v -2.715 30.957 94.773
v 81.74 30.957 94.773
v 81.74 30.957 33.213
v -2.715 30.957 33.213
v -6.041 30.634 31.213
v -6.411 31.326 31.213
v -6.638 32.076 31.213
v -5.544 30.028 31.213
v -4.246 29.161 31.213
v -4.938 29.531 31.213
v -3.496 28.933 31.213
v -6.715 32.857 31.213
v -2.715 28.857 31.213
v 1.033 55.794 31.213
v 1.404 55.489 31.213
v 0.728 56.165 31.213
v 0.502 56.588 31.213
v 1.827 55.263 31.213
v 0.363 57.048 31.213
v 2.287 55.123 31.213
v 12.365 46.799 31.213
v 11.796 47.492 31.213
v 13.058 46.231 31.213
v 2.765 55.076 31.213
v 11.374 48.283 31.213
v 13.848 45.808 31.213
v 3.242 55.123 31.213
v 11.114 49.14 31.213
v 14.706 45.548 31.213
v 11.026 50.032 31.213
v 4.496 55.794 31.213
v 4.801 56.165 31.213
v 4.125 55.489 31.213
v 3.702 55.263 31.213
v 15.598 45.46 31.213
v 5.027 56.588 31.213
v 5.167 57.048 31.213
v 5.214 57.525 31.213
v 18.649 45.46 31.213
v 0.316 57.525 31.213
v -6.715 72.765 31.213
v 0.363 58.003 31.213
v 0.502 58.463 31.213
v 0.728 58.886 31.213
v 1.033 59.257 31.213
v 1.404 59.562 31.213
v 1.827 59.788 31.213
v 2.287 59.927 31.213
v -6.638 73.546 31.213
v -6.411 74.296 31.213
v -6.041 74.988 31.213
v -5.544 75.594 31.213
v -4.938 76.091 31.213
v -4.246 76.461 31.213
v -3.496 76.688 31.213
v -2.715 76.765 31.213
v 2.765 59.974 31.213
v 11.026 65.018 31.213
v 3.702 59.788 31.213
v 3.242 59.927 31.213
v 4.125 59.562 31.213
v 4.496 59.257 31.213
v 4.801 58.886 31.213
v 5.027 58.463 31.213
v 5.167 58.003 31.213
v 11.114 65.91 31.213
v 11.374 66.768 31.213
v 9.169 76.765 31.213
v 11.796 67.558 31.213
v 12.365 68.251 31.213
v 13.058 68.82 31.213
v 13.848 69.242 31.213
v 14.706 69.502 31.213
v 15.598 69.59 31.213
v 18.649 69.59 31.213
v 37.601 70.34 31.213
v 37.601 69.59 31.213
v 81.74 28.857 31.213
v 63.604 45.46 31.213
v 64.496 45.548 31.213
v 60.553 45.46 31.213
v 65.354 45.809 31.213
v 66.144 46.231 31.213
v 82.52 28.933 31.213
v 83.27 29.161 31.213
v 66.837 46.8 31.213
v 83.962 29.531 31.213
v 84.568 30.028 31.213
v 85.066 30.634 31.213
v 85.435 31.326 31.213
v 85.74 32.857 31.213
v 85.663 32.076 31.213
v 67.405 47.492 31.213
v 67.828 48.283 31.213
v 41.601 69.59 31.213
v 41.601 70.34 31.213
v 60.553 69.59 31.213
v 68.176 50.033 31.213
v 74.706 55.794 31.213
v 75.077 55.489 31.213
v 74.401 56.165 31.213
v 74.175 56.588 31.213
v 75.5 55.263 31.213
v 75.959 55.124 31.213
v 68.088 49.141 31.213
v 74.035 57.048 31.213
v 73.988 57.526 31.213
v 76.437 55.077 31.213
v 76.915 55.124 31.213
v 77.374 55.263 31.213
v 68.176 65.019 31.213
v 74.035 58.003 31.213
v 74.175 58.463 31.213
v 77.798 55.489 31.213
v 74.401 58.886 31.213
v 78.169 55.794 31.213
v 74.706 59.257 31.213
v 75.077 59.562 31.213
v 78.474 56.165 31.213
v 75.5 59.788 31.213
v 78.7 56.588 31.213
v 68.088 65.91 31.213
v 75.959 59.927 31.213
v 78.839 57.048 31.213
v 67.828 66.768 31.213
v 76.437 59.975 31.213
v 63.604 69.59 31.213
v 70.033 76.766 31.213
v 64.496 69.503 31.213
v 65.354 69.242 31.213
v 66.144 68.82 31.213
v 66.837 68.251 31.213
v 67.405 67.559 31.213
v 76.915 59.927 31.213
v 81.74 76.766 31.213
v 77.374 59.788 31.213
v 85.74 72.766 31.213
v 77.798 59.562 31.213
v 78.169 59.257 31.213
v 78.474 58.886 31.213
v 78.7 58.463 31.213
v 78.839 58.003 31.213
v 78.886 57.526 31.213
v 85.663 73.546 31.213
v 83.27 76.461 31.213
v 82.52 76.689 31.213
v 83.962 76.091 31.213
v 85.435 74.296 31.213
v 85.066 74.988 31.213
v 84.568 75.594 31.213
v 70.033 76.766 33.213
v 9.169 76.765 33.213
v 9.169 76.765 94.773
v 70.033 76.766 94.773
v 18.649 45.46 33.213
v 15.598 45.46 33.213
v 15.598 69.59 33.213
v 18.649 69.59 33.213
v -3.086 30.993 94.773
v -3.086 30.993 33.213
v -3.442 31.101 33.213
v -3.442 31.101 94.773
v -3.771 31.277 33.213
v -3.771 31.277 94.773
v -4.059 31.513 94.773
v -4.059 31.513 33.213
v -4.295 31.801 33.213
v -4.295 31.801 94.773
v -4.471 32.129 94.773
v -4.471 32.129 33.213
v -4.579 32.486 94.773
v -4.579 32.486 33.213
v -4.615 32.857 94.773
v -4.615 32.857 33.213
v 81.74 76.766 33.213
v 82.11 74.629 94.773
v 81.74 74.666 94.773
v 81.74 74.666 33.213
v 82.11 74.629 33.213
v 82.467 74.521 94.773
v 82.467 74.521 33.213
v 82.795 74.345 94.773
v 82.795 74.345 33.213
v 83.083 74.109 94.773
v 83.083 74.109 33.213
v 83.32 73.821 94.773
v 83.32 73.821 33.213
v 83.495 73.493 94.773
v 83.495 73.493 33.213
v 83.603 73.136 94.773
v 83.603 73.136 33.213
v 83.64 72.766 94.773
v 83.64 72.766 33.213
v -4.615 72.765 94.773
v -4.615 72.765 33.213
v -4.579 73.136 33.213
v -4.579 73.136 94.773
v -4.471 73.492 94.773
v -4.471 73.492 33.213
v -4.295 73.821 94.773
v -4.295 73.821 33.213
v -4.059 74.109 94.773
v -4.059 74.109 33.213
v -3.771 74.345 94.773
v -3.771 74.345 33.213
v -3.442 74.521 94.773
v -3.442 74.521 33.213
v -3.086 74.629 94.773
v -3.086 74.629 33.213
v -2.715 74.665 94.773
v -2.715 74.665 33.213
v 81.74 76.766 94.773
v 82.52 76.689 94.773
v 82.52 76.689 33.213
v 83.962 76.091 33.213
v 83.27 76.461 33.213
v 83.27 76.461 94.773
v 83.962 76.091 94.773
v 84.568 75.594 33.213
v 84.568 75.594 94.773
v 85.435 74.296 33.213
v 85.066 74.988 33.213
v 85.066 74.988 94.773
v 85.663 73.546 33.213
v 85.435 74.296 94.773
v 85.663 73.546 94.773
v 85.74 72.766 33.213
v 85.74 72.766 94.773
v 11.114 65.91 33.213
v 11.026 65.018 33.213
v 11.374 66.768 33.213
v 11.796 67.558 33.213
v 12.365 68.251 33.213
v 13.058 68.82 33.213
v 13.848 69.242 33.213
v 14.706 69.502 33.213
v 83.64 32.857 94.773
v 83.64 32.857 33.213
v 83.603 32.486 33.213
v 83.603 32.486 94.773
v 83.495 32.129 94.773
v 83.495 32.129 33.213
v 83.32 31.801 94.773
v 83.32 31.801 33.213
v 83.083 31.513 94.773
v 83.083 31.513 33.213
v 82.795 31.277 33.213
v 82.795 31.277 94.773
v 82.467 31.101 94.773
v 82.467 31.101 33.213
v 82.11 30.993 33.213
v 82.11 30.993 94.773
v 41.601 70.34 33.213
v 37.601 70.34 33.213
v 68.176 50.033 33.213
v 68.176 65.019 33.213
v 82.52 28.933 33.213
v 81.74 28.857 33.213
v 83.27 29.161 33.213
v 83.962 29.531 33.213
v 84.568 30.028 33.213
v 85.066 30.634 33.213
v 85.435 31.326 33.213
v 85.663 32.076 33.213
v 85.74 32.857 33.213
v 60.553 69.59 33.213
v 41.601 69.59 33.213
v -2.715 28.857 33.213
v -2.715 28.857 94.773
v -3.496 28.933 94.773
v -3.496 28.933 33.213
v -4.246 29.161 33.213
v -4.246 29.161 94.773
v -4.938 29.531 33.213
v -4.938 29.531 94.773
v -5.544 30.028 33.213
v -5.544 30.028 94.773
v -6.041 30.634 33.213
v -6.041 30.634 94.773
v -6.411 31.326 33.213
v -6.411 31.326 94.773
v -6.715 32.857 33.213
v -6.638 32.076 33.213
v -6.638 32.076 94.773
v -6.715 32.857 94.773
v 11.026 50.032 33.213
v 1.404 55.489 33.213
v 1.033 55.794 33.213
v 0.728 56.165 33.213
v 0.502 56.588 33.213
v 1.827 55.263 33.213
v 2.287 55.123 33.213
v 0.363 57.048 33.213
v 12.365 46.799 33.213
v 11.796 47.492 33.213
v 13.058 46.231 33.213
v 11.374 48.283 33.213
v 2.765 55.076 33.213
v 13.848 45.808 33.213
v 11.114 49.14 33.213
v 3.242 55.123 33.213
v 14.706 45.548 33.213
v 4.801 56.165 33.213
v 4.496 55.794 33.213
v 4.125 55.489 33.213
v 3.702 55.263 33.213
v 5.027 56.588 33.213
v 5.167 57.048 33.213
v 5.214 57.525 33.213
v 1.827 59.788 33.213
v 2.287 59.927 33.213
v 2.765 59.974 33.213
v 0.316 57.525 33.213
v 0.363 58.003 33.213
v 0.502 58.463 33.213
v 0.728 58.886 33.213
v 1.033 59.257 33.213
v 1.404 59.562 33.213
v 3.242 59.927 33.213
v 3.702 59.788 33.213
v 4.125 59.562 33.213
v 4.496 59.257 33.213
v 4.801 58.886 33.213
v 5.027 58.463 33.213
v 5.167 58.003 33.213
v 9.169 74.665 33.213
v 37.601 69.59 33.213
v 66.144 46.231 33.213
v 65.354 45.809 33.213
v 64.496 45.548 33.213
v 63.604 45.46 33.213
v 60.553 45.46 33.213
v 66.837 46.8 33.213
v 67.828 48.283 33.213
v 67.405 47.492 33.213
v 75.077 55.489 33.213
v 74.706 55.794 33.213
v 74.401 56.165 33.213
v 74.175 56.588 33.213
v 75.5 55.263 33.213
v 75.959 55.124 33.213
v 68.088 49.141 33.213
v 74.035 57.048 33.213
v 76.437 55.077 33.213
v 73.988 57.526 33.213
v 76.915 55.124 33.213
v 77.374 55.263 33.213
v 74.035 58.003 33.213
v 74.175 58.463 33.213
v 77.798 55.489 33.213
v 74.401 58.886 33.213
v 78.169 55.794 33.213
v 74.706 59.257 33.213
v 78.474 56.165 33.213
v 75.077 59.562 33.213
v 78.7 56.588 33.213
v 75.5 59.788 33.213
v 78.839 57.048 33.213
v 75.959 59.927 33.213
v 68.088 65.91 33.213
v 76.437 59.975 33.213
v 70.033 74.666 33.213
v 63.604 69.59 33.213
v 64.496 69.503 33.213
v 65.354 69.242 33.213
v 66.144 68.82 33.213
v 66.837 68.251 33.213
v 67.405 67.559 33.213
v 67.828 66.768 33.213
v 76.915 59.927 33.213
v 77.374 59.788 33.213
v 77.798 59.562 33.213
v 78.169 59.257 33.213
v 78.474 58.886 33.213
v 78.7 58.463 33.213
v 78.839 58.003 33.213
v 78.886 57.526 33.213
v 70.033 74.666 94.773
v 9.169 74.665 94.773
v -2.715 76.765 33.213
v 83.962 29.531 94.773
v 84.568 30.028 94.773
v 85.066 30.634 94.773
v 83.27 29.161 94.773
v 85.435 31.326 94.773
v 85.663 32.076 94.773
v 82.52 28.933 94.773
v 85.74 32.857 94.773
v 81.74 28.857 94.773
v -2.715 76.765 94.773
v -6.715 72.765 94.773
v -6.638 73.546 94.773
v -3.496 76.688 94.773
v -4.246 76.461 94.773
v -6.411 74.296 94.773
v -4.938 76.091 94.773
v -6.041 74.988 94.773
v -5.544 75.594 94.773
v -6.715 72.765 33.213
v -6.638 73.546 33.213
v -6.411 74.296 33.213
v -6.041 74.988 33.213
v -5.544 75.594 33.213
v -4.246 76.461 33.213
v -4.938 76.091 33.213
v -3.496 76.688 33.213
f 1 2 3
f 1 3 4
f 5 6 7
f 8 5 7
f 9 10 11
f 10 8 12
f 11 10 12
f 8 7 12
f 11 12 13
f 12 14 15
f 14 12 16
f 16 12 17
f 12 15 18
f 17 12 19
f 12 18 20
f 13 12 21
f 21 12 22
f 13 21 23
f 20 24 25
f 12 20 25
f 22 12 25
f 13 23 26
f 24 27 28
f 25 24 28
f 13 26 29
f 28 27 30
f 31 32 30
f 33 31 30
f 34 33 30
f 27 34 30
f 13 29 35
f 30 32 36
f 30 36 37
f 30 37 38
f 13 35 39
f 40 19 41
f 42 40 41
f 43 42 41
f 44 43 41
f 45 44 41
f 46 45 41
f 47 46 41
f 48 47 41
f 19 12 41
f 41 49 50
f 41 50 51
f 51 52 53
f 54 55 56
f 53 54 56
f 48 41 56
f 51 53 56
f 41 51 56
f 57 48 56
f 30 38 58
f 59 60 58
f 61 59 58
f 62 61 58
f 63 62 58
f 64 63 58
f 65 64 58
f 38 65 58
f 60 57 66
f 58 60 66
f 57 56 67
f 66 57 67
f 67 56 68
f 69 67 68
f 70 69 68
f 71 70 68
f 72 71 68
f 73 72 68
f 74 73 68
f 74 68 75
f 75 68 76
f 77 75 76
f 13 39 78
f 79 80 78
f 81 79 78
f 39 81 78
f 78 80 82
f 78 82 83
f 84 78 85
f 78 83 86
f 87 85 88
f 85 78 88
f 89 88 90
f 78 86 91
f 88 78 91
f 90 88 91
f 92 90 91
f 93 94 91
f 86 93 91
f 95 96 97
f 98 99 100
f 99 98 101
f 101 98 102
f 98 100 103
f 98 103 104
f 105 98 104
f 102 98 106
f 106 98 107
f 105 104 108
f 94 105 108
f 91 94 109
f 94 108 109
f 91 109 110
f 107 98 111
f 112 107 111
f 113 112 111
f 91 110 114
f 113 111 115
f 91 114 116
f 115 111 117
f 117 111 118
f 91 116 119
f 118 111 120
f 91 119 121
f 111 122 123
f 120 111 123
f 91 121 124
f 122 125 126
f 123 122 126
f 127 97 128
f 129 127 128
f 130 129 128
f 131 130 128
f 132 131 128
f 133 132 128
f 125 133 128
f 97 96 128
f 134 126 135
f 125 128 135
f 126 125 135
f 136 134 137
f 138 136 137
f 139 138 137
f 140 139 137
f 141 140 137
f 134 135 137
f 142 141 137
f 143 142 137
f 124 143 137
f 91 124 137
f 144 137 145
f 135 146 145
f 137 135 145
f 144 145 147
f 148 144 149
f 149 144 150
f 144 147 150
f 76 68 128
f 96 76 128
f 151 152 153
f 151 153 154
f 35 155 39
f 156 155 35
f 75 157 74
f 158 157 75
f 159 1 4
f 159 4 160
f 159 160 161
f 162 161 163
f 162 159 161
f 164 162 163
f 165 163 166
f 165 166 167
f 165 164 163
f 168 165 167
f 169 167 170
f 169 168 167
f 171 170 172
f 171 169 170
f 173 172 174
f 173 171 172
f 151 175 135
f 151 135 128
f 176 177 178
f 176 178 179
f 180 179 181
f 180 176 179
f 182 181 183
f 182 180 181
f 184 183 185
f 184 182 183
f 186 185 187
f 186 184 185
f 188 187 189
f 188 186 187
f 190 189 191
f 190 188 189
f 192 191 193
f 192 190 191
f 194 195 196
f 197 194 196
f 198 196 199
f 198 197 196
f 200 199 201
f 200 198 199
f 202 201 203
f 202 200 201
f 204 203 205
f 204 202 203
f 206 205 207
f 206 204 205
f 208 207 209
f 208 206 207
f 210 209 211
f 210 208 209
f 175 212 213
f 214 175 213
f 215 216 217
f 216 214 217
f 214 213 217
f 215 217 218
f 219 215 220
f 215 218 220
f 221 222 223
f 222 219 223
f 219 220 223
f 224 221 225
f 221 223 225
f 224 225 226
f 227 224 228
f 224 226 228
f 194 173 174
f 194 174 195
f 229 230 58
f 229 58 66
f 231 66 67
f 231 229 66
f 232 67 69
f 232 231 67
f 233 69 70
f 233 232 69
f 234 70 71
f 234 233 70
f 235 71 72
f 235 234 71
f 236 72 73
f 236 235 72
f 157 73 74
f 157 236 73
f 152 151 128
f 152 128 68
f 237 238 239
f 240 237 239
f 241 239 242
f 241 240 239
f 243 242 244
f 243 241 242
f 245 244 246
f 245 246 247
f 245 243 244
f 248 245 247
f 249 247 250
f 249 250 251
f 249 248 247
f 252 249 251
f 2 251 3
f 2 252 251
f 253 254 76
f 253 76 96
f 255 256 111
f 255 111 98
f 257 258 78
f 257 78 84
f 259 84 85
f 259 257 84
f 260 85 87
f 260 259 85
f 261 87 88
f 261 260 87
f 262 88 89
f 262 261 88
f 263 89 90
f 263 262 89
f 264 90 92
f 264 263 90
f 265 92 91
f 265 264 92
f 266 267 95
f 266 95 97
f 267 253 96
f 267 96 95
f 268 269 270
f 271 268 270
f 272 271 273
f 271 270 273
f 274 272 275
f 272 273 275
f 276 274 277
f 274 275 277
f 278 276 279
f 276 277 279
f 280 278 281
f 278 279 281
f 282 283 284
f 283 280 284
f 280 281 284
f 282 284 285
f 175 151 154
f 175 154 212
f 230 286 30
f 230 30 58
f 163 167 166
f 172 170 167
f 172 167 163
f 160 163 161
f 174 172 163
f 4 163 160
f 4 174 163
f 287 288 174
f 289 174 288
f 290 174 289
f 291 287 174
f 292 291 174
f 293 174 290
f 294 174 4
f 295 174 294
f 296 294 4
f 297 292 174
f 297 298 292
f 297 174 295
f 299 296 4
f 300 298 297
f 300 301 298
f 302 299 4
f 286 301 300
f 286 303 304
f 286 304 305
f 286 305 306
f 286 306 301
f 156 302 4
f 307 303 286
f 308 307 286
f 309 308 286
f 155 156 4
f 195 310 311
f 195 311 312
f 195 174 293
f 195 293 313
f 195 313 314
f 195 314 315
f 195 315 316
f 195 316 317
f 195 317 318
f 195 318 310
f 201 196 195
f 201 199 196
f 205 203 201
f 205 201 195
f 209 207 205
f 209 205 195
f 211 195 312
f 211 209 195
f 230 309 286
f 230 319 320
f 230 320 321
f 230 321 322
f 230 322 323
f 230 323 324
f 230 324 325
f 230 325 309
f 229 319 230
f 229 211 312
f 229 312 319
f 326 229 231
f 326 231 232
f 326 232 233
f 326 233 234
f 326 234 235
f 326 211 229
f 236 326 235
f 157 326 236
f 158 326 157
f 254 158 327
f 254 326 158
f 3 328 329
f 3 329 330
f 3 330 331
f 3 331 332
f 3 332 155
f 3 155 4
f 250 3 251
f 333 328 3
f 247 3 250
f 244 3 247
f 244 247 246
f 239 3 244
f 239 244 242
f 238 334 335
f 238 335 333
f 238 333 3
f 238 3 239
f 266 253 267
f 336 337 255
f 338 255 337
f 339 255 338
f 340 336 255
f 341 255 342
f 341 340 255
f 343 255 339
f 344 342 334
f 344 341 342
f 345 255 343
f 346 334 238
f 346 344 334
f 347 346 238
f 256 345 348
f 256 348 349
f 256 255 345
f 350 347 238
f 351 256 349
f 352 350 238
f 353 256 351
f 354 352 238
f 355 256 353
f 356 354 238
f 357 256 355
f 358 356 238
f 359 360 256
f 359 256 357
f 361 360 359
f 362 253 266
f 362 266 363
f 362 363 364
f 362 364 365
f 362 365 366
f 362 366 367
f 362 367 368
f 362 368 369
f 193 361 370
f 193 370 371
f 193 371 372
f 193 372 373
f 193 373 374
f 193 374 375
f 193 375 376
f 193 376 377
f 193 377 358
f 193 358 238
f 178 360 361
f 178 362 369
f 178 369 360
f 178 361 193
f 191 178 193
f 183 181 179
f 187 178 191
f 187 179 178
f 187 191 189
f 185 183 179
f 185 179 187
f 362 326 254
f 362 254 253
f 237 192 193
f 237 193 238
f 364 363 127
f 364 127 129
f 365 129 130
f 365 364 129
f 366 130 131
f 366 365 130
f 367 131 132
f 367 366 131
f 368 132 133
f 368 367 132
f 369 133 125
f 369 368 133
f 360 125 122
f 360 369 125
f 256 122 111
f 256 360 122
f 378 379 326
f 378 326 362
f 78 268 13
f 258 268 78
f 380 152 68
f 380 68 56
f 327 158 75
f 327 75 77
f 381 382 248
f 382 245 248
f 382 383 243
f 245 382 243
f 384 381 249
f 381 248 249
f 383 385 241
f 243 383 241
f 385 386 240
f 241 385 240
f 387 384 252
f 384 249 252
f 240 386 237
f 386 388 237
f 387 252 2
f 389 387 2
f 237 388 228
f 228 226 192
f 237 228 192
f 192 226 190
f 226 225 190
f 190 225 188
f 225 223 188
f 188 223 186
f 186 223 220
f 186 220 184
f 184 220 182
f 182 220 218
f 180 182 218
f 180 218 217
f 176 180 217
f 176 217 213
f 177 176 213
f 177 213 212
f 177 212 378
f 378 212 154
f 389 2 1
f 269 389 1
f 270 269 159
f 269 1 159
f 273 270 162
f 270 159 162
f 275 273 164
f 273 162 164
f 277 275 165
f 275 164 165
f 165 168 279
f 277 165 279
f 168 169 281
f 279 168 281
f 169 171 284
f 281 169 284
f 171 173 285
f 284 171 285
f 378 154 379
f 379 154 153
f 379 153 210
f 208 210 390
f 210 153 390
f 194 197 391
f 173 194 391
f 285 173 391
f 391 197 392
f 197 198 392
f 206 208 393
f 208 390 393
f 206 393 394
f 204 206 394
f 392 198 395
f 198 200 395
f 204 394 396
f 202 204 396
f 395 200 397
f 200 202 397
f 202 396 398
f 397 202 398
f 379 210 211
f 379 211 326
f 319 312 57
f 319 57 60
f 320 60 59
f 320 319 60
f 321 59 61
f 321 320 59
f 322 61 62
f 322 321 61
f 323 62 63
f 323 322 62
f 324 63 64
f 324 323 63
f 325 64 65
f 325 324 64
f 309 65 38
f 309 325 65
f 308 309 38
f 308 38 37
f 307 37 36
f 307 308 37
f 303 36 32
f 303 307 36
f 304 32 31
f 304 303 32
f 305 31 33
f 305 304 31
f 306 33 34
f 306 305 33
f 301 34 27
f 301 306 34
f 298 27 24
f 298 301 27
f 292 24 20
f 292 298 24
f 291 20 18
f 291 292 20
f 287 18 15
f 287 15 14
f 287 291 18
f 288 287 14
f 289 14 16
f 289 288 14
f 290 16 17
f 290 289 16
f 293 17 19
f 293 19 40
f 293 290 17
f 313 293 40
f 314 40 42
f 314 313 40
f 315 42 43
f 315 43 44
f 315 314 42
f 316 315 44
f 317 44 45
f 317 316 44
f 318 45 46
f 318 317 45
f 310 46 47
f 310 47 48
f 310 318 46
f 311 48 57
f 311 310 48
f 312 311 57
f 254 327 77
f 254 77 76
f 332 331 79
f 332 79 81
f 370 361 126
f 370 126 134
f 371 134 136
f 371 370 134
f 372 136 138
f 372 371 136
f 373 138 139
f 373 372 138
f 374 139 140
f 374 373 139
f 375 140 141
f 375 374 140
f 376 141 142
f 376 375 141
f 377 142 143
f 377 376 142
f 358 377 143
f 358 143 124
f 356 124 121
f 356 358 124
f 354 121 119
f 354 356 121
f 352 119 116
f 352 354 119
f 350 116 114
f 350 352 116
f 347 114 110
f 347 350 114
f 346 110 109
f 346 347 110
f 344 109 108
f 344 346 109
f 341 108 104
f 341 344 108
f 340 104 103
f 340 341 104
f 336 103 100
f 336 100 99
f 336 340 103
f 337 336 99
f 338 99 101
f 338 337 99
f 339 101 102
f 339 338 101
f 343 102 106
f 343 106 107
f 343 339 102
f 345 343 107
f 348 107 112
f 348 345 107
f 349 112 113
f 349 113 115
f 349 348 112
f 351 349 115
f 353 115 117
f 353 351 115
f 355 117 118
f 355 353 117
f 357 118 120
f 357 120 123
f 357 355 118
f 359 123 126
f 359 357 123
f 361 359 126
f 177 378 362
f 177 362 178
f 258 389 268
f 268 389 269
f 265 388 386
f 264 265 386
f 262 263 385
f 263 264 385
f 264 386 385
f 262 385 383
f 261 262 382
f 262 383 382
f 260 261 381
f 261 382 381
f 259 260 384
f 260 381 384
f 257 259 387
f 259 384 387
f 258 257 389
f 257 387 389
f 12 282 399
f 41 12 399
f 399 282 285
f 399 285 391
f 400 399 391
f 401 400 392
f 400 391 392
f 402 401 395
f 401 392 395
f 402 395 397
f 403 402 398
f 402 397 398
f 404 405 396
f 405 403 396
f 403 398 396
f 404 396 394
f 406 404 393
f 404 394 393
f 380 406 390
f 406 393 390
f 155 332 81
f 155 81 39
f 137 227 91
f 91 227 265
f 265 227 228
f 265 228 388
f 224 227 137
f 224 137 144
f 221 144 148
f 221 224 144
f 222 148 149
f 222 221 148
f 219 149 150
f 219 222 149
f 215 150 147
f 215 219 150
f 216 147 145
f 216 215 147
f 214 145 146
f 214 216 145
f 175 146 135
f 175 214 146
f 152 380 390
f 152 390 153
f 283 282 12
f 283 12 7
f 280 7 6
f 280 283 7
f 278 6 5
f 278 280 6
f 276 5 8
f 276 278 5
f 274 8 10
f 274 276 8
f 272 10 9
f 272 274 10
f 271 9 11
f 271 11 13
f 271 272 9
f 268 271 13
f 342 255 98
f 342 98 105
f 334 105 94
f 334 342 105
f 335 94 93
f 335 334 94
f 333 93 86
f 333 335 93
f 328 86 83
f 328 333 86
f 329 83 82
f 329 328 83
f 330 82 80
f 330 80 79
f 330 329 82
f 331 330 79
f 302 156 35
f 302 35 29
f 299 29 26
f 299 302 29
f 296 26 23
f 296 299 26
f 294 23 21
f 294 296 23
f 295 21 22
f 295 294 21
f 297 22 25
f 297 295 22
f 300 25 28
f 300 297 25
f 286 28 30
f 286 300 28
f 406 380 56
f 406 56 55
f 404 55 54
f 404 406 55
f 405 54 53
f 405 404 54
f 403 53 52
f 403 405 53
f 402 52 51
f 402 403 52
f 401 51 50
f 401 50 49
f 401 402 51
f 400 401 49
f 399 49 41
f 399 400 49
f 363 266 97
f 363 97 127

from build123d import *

# Parameters (mm, degrees)
SKETCH1_R           = 2.449
BOSS_EXTRUDE1_DEPTH = 2
BOSS_EXTRUDE2_START = 61.5600102
BOSS_EXTRUDE2_DEPTH = 61.5600102


with BuildPart() as part:
    # Sketch1 → Boss-Extrude1 (new body)
    with BuildSketch(Plane(origin=(0, 7e-09, 33.21323041), x_dir=(-1, 0, 0), z_dir=(0, -2.14626958308228e-10, -1.0))):
        with BuildLine():
            Line((-81.739723186, 76.765508674), (-70.033136805, 76.765508674))
            Line((-70.033136805, 76.765508674), (-9.168561928, 76.76533218))
            Line((-9.168561928, 76.76533218), (2.715276814, 76.76533218))
            ThreePointArc((2.715276814, 76.76533218), (5.543703939, 75.593759305), (6.715276814, 72.76533218))
            Line((6.715276814, 72.76533218), (6.715276814, 40.456513609))
            Line((6.715276814, 40.456513609), (6.715276814, 38.856513609))
            Line((6.715276814, 38.856513609), (6.715276814, 32.856513609))
            ThreePointArc((6.715276814, 32.856513609), (5.543703939, 30.028086484), (2.715276814, 28.856513609))
            Line((2.715276814, 28.856513609), (-81.739723186, 28.856513609))
            ThreePointArc((-81.739723186, 28.856513609), (-84.56815031, 30.028086484), (-85.739723186, 32.856513609))
            Line((-85.739723186, 32.856513609), (-85.739723186, 38.856513609))
            Line((-85.739723186, 38.856513609), (-85.739723186, 40.456513609))
            Line((-85.739723186, 40.456513609), (-85.739723186, 72.765508674))
            ThreePointArc((-85.739723186, 72.765508674), (-84.56815031, 75.593935798), (-81.739723186, 76.765508674))
        make_face()
        with Locations(Location((-2.764563873, 57.52531361, 0), (0, 0, 90))):
            Circle(SKETCH1_R, mode=Mode.SUBTRACT)
        with Locations(Location((-76.437246444, 57.525527244, 0), (0, 0, 90))):
            Circle(SKETCH1_R, mode=Mode.SUBTRACT)
        with BuildLine():
            Line((-63.603943309, 45.46049003), (-60.552841344, 45.460481183))
            Line((-60.552841344, 45.460481183), (-18.649041914, 45.460359671))
            Line((-18.649041914, 45.460359671), (-15.597940144, 45.460350824))
            ThreePointArc((-15.597940144, 45.460350824), (-12.365044057, 46.799449246), (-11.025926886, 50.032337566))
            Line((-11.025926886, 50.032337566), (-11.02588343, 65.018337566))
            ThreePointArc((-11.02588343, 65.018337566), (-12.364981852, 68.251233653), (-15.597870172, 69.590350824))
            Line((-15.597870172, 69.590350824), (-18.648972138, 69.59035918))
            Line((-18.648972138, 69.59035918), (-37.600871755, 69.590414358))
            Line((-37.600871755, 69.590414358), (-37.600871755, 70.340426004))
            Line((-37.600871755, 70.340426004), (-41.600871755, 70.340426004))
            Line((-41.600871755, 70.340426004), (-41.600871755, 69.590426004))
            Line((-41.600871755, 69.590426004), (-60.552771373, 69.590481183))
            Line((-60.552771373, 69.590481183), (-63.603873338, 69.59049003))
            ThreePointArc((-63.603873338, 69.59049003), (-66.836769424, 68.251391608), (-68.175886596, 65.018503288))
            Line((-68.175886596, 65.018503288), (-68.175930051, 50.032503288))
            ThreePointArc((-68.175930051, 50.032503288), (-66.83683163, 46.799607201), (-63.603943309, 45.46049003))
        make_face(mode=Mode.SUBTRACT)
    extrude(amount=BOSS_EXTRUDE1_DEPTH)

    # Sketch2 → Boss-Extrude2 (add)
    with BuildSketch(Plane.XY.offset(33.21323041).offset(BOSS_EXTRUDE2_START)):
        with BuildLine():
            Line((81.739723186, 28.856513609), (-2.715276814, 28.856513609))
            ThreePointArc((-2.715276814, 28.856513609), (-5.543703939, 30.028086484), (-6.715276814, 32.856513609))
            Line((-6.715276814, 32.856513609), (-6.715276814, 72.76533218))
            ThreePointArc((-6.715276814, 72.76533218), (-5.543703939, 75.593759305), (-2.715276814, 76.76533218))
            Line((-2.715276814, 76.76533218), (9.168561928, 76.76533218))
            Line((9.168561928, 76.76533218), (70.033136805, 76.765508674))
            Line((70.033136805, 76.765508674), (81.739723186, 76.765508674))
            ThreePointArc((81.739723186, 76.765508674), (84.56815031, 75.593935798), (85.739723186, 72.765508674))
            Line((85.739723186, 72.765508674), (85.739723186, 32.856513609))
            ThreePointArc((85.739723186, 32.856513609), (84.56815031, 30.028086484), (81.739723186, 28.856513609))
        make_face()
        with BuildLine():
            Line((9.168568018, 74.66533218), (70.033142895, 74.665508674))
            Line((70.033142895, 74.665508674), (81.739723186, 74.665508674))
            ThreePointArc((81.739723186, 74.665508674), (83.08322607, 74.109011558), (83.639723186, 72.765508674))
            Line((83.639723186, 72.765508674), (83.639723186, 32.856513609))
            ThreePointArc((83.639723186, 32.856513609), (83.08322607, 31.513010725), (81.739723186, 30.956513609))
            Line((81.739723186, 30.956513609), (-2.715276814, 30.956513609))
            ThreePointArc((-2.715276814, 30.956513609), (-4.058779699, 31.513010725), (-4.615276814, 32.856513609))
            Line((-4.615276814, 32.856513609), (-4.615276814, 72.76533218))
            ThreePointArc((-4.615276814, 72.76533218), (-4.058779699, 74.108835065), (-2.715276814, 74.66533218))
            Line((-2.715276814, 74.66533218), (9.168568018, 74.66533218))
        make_face(mode=Mode.SUBTRACT)
    extrude(amount=-BOSS_EXTRUDE2_DEPTH)


solid = part.part
